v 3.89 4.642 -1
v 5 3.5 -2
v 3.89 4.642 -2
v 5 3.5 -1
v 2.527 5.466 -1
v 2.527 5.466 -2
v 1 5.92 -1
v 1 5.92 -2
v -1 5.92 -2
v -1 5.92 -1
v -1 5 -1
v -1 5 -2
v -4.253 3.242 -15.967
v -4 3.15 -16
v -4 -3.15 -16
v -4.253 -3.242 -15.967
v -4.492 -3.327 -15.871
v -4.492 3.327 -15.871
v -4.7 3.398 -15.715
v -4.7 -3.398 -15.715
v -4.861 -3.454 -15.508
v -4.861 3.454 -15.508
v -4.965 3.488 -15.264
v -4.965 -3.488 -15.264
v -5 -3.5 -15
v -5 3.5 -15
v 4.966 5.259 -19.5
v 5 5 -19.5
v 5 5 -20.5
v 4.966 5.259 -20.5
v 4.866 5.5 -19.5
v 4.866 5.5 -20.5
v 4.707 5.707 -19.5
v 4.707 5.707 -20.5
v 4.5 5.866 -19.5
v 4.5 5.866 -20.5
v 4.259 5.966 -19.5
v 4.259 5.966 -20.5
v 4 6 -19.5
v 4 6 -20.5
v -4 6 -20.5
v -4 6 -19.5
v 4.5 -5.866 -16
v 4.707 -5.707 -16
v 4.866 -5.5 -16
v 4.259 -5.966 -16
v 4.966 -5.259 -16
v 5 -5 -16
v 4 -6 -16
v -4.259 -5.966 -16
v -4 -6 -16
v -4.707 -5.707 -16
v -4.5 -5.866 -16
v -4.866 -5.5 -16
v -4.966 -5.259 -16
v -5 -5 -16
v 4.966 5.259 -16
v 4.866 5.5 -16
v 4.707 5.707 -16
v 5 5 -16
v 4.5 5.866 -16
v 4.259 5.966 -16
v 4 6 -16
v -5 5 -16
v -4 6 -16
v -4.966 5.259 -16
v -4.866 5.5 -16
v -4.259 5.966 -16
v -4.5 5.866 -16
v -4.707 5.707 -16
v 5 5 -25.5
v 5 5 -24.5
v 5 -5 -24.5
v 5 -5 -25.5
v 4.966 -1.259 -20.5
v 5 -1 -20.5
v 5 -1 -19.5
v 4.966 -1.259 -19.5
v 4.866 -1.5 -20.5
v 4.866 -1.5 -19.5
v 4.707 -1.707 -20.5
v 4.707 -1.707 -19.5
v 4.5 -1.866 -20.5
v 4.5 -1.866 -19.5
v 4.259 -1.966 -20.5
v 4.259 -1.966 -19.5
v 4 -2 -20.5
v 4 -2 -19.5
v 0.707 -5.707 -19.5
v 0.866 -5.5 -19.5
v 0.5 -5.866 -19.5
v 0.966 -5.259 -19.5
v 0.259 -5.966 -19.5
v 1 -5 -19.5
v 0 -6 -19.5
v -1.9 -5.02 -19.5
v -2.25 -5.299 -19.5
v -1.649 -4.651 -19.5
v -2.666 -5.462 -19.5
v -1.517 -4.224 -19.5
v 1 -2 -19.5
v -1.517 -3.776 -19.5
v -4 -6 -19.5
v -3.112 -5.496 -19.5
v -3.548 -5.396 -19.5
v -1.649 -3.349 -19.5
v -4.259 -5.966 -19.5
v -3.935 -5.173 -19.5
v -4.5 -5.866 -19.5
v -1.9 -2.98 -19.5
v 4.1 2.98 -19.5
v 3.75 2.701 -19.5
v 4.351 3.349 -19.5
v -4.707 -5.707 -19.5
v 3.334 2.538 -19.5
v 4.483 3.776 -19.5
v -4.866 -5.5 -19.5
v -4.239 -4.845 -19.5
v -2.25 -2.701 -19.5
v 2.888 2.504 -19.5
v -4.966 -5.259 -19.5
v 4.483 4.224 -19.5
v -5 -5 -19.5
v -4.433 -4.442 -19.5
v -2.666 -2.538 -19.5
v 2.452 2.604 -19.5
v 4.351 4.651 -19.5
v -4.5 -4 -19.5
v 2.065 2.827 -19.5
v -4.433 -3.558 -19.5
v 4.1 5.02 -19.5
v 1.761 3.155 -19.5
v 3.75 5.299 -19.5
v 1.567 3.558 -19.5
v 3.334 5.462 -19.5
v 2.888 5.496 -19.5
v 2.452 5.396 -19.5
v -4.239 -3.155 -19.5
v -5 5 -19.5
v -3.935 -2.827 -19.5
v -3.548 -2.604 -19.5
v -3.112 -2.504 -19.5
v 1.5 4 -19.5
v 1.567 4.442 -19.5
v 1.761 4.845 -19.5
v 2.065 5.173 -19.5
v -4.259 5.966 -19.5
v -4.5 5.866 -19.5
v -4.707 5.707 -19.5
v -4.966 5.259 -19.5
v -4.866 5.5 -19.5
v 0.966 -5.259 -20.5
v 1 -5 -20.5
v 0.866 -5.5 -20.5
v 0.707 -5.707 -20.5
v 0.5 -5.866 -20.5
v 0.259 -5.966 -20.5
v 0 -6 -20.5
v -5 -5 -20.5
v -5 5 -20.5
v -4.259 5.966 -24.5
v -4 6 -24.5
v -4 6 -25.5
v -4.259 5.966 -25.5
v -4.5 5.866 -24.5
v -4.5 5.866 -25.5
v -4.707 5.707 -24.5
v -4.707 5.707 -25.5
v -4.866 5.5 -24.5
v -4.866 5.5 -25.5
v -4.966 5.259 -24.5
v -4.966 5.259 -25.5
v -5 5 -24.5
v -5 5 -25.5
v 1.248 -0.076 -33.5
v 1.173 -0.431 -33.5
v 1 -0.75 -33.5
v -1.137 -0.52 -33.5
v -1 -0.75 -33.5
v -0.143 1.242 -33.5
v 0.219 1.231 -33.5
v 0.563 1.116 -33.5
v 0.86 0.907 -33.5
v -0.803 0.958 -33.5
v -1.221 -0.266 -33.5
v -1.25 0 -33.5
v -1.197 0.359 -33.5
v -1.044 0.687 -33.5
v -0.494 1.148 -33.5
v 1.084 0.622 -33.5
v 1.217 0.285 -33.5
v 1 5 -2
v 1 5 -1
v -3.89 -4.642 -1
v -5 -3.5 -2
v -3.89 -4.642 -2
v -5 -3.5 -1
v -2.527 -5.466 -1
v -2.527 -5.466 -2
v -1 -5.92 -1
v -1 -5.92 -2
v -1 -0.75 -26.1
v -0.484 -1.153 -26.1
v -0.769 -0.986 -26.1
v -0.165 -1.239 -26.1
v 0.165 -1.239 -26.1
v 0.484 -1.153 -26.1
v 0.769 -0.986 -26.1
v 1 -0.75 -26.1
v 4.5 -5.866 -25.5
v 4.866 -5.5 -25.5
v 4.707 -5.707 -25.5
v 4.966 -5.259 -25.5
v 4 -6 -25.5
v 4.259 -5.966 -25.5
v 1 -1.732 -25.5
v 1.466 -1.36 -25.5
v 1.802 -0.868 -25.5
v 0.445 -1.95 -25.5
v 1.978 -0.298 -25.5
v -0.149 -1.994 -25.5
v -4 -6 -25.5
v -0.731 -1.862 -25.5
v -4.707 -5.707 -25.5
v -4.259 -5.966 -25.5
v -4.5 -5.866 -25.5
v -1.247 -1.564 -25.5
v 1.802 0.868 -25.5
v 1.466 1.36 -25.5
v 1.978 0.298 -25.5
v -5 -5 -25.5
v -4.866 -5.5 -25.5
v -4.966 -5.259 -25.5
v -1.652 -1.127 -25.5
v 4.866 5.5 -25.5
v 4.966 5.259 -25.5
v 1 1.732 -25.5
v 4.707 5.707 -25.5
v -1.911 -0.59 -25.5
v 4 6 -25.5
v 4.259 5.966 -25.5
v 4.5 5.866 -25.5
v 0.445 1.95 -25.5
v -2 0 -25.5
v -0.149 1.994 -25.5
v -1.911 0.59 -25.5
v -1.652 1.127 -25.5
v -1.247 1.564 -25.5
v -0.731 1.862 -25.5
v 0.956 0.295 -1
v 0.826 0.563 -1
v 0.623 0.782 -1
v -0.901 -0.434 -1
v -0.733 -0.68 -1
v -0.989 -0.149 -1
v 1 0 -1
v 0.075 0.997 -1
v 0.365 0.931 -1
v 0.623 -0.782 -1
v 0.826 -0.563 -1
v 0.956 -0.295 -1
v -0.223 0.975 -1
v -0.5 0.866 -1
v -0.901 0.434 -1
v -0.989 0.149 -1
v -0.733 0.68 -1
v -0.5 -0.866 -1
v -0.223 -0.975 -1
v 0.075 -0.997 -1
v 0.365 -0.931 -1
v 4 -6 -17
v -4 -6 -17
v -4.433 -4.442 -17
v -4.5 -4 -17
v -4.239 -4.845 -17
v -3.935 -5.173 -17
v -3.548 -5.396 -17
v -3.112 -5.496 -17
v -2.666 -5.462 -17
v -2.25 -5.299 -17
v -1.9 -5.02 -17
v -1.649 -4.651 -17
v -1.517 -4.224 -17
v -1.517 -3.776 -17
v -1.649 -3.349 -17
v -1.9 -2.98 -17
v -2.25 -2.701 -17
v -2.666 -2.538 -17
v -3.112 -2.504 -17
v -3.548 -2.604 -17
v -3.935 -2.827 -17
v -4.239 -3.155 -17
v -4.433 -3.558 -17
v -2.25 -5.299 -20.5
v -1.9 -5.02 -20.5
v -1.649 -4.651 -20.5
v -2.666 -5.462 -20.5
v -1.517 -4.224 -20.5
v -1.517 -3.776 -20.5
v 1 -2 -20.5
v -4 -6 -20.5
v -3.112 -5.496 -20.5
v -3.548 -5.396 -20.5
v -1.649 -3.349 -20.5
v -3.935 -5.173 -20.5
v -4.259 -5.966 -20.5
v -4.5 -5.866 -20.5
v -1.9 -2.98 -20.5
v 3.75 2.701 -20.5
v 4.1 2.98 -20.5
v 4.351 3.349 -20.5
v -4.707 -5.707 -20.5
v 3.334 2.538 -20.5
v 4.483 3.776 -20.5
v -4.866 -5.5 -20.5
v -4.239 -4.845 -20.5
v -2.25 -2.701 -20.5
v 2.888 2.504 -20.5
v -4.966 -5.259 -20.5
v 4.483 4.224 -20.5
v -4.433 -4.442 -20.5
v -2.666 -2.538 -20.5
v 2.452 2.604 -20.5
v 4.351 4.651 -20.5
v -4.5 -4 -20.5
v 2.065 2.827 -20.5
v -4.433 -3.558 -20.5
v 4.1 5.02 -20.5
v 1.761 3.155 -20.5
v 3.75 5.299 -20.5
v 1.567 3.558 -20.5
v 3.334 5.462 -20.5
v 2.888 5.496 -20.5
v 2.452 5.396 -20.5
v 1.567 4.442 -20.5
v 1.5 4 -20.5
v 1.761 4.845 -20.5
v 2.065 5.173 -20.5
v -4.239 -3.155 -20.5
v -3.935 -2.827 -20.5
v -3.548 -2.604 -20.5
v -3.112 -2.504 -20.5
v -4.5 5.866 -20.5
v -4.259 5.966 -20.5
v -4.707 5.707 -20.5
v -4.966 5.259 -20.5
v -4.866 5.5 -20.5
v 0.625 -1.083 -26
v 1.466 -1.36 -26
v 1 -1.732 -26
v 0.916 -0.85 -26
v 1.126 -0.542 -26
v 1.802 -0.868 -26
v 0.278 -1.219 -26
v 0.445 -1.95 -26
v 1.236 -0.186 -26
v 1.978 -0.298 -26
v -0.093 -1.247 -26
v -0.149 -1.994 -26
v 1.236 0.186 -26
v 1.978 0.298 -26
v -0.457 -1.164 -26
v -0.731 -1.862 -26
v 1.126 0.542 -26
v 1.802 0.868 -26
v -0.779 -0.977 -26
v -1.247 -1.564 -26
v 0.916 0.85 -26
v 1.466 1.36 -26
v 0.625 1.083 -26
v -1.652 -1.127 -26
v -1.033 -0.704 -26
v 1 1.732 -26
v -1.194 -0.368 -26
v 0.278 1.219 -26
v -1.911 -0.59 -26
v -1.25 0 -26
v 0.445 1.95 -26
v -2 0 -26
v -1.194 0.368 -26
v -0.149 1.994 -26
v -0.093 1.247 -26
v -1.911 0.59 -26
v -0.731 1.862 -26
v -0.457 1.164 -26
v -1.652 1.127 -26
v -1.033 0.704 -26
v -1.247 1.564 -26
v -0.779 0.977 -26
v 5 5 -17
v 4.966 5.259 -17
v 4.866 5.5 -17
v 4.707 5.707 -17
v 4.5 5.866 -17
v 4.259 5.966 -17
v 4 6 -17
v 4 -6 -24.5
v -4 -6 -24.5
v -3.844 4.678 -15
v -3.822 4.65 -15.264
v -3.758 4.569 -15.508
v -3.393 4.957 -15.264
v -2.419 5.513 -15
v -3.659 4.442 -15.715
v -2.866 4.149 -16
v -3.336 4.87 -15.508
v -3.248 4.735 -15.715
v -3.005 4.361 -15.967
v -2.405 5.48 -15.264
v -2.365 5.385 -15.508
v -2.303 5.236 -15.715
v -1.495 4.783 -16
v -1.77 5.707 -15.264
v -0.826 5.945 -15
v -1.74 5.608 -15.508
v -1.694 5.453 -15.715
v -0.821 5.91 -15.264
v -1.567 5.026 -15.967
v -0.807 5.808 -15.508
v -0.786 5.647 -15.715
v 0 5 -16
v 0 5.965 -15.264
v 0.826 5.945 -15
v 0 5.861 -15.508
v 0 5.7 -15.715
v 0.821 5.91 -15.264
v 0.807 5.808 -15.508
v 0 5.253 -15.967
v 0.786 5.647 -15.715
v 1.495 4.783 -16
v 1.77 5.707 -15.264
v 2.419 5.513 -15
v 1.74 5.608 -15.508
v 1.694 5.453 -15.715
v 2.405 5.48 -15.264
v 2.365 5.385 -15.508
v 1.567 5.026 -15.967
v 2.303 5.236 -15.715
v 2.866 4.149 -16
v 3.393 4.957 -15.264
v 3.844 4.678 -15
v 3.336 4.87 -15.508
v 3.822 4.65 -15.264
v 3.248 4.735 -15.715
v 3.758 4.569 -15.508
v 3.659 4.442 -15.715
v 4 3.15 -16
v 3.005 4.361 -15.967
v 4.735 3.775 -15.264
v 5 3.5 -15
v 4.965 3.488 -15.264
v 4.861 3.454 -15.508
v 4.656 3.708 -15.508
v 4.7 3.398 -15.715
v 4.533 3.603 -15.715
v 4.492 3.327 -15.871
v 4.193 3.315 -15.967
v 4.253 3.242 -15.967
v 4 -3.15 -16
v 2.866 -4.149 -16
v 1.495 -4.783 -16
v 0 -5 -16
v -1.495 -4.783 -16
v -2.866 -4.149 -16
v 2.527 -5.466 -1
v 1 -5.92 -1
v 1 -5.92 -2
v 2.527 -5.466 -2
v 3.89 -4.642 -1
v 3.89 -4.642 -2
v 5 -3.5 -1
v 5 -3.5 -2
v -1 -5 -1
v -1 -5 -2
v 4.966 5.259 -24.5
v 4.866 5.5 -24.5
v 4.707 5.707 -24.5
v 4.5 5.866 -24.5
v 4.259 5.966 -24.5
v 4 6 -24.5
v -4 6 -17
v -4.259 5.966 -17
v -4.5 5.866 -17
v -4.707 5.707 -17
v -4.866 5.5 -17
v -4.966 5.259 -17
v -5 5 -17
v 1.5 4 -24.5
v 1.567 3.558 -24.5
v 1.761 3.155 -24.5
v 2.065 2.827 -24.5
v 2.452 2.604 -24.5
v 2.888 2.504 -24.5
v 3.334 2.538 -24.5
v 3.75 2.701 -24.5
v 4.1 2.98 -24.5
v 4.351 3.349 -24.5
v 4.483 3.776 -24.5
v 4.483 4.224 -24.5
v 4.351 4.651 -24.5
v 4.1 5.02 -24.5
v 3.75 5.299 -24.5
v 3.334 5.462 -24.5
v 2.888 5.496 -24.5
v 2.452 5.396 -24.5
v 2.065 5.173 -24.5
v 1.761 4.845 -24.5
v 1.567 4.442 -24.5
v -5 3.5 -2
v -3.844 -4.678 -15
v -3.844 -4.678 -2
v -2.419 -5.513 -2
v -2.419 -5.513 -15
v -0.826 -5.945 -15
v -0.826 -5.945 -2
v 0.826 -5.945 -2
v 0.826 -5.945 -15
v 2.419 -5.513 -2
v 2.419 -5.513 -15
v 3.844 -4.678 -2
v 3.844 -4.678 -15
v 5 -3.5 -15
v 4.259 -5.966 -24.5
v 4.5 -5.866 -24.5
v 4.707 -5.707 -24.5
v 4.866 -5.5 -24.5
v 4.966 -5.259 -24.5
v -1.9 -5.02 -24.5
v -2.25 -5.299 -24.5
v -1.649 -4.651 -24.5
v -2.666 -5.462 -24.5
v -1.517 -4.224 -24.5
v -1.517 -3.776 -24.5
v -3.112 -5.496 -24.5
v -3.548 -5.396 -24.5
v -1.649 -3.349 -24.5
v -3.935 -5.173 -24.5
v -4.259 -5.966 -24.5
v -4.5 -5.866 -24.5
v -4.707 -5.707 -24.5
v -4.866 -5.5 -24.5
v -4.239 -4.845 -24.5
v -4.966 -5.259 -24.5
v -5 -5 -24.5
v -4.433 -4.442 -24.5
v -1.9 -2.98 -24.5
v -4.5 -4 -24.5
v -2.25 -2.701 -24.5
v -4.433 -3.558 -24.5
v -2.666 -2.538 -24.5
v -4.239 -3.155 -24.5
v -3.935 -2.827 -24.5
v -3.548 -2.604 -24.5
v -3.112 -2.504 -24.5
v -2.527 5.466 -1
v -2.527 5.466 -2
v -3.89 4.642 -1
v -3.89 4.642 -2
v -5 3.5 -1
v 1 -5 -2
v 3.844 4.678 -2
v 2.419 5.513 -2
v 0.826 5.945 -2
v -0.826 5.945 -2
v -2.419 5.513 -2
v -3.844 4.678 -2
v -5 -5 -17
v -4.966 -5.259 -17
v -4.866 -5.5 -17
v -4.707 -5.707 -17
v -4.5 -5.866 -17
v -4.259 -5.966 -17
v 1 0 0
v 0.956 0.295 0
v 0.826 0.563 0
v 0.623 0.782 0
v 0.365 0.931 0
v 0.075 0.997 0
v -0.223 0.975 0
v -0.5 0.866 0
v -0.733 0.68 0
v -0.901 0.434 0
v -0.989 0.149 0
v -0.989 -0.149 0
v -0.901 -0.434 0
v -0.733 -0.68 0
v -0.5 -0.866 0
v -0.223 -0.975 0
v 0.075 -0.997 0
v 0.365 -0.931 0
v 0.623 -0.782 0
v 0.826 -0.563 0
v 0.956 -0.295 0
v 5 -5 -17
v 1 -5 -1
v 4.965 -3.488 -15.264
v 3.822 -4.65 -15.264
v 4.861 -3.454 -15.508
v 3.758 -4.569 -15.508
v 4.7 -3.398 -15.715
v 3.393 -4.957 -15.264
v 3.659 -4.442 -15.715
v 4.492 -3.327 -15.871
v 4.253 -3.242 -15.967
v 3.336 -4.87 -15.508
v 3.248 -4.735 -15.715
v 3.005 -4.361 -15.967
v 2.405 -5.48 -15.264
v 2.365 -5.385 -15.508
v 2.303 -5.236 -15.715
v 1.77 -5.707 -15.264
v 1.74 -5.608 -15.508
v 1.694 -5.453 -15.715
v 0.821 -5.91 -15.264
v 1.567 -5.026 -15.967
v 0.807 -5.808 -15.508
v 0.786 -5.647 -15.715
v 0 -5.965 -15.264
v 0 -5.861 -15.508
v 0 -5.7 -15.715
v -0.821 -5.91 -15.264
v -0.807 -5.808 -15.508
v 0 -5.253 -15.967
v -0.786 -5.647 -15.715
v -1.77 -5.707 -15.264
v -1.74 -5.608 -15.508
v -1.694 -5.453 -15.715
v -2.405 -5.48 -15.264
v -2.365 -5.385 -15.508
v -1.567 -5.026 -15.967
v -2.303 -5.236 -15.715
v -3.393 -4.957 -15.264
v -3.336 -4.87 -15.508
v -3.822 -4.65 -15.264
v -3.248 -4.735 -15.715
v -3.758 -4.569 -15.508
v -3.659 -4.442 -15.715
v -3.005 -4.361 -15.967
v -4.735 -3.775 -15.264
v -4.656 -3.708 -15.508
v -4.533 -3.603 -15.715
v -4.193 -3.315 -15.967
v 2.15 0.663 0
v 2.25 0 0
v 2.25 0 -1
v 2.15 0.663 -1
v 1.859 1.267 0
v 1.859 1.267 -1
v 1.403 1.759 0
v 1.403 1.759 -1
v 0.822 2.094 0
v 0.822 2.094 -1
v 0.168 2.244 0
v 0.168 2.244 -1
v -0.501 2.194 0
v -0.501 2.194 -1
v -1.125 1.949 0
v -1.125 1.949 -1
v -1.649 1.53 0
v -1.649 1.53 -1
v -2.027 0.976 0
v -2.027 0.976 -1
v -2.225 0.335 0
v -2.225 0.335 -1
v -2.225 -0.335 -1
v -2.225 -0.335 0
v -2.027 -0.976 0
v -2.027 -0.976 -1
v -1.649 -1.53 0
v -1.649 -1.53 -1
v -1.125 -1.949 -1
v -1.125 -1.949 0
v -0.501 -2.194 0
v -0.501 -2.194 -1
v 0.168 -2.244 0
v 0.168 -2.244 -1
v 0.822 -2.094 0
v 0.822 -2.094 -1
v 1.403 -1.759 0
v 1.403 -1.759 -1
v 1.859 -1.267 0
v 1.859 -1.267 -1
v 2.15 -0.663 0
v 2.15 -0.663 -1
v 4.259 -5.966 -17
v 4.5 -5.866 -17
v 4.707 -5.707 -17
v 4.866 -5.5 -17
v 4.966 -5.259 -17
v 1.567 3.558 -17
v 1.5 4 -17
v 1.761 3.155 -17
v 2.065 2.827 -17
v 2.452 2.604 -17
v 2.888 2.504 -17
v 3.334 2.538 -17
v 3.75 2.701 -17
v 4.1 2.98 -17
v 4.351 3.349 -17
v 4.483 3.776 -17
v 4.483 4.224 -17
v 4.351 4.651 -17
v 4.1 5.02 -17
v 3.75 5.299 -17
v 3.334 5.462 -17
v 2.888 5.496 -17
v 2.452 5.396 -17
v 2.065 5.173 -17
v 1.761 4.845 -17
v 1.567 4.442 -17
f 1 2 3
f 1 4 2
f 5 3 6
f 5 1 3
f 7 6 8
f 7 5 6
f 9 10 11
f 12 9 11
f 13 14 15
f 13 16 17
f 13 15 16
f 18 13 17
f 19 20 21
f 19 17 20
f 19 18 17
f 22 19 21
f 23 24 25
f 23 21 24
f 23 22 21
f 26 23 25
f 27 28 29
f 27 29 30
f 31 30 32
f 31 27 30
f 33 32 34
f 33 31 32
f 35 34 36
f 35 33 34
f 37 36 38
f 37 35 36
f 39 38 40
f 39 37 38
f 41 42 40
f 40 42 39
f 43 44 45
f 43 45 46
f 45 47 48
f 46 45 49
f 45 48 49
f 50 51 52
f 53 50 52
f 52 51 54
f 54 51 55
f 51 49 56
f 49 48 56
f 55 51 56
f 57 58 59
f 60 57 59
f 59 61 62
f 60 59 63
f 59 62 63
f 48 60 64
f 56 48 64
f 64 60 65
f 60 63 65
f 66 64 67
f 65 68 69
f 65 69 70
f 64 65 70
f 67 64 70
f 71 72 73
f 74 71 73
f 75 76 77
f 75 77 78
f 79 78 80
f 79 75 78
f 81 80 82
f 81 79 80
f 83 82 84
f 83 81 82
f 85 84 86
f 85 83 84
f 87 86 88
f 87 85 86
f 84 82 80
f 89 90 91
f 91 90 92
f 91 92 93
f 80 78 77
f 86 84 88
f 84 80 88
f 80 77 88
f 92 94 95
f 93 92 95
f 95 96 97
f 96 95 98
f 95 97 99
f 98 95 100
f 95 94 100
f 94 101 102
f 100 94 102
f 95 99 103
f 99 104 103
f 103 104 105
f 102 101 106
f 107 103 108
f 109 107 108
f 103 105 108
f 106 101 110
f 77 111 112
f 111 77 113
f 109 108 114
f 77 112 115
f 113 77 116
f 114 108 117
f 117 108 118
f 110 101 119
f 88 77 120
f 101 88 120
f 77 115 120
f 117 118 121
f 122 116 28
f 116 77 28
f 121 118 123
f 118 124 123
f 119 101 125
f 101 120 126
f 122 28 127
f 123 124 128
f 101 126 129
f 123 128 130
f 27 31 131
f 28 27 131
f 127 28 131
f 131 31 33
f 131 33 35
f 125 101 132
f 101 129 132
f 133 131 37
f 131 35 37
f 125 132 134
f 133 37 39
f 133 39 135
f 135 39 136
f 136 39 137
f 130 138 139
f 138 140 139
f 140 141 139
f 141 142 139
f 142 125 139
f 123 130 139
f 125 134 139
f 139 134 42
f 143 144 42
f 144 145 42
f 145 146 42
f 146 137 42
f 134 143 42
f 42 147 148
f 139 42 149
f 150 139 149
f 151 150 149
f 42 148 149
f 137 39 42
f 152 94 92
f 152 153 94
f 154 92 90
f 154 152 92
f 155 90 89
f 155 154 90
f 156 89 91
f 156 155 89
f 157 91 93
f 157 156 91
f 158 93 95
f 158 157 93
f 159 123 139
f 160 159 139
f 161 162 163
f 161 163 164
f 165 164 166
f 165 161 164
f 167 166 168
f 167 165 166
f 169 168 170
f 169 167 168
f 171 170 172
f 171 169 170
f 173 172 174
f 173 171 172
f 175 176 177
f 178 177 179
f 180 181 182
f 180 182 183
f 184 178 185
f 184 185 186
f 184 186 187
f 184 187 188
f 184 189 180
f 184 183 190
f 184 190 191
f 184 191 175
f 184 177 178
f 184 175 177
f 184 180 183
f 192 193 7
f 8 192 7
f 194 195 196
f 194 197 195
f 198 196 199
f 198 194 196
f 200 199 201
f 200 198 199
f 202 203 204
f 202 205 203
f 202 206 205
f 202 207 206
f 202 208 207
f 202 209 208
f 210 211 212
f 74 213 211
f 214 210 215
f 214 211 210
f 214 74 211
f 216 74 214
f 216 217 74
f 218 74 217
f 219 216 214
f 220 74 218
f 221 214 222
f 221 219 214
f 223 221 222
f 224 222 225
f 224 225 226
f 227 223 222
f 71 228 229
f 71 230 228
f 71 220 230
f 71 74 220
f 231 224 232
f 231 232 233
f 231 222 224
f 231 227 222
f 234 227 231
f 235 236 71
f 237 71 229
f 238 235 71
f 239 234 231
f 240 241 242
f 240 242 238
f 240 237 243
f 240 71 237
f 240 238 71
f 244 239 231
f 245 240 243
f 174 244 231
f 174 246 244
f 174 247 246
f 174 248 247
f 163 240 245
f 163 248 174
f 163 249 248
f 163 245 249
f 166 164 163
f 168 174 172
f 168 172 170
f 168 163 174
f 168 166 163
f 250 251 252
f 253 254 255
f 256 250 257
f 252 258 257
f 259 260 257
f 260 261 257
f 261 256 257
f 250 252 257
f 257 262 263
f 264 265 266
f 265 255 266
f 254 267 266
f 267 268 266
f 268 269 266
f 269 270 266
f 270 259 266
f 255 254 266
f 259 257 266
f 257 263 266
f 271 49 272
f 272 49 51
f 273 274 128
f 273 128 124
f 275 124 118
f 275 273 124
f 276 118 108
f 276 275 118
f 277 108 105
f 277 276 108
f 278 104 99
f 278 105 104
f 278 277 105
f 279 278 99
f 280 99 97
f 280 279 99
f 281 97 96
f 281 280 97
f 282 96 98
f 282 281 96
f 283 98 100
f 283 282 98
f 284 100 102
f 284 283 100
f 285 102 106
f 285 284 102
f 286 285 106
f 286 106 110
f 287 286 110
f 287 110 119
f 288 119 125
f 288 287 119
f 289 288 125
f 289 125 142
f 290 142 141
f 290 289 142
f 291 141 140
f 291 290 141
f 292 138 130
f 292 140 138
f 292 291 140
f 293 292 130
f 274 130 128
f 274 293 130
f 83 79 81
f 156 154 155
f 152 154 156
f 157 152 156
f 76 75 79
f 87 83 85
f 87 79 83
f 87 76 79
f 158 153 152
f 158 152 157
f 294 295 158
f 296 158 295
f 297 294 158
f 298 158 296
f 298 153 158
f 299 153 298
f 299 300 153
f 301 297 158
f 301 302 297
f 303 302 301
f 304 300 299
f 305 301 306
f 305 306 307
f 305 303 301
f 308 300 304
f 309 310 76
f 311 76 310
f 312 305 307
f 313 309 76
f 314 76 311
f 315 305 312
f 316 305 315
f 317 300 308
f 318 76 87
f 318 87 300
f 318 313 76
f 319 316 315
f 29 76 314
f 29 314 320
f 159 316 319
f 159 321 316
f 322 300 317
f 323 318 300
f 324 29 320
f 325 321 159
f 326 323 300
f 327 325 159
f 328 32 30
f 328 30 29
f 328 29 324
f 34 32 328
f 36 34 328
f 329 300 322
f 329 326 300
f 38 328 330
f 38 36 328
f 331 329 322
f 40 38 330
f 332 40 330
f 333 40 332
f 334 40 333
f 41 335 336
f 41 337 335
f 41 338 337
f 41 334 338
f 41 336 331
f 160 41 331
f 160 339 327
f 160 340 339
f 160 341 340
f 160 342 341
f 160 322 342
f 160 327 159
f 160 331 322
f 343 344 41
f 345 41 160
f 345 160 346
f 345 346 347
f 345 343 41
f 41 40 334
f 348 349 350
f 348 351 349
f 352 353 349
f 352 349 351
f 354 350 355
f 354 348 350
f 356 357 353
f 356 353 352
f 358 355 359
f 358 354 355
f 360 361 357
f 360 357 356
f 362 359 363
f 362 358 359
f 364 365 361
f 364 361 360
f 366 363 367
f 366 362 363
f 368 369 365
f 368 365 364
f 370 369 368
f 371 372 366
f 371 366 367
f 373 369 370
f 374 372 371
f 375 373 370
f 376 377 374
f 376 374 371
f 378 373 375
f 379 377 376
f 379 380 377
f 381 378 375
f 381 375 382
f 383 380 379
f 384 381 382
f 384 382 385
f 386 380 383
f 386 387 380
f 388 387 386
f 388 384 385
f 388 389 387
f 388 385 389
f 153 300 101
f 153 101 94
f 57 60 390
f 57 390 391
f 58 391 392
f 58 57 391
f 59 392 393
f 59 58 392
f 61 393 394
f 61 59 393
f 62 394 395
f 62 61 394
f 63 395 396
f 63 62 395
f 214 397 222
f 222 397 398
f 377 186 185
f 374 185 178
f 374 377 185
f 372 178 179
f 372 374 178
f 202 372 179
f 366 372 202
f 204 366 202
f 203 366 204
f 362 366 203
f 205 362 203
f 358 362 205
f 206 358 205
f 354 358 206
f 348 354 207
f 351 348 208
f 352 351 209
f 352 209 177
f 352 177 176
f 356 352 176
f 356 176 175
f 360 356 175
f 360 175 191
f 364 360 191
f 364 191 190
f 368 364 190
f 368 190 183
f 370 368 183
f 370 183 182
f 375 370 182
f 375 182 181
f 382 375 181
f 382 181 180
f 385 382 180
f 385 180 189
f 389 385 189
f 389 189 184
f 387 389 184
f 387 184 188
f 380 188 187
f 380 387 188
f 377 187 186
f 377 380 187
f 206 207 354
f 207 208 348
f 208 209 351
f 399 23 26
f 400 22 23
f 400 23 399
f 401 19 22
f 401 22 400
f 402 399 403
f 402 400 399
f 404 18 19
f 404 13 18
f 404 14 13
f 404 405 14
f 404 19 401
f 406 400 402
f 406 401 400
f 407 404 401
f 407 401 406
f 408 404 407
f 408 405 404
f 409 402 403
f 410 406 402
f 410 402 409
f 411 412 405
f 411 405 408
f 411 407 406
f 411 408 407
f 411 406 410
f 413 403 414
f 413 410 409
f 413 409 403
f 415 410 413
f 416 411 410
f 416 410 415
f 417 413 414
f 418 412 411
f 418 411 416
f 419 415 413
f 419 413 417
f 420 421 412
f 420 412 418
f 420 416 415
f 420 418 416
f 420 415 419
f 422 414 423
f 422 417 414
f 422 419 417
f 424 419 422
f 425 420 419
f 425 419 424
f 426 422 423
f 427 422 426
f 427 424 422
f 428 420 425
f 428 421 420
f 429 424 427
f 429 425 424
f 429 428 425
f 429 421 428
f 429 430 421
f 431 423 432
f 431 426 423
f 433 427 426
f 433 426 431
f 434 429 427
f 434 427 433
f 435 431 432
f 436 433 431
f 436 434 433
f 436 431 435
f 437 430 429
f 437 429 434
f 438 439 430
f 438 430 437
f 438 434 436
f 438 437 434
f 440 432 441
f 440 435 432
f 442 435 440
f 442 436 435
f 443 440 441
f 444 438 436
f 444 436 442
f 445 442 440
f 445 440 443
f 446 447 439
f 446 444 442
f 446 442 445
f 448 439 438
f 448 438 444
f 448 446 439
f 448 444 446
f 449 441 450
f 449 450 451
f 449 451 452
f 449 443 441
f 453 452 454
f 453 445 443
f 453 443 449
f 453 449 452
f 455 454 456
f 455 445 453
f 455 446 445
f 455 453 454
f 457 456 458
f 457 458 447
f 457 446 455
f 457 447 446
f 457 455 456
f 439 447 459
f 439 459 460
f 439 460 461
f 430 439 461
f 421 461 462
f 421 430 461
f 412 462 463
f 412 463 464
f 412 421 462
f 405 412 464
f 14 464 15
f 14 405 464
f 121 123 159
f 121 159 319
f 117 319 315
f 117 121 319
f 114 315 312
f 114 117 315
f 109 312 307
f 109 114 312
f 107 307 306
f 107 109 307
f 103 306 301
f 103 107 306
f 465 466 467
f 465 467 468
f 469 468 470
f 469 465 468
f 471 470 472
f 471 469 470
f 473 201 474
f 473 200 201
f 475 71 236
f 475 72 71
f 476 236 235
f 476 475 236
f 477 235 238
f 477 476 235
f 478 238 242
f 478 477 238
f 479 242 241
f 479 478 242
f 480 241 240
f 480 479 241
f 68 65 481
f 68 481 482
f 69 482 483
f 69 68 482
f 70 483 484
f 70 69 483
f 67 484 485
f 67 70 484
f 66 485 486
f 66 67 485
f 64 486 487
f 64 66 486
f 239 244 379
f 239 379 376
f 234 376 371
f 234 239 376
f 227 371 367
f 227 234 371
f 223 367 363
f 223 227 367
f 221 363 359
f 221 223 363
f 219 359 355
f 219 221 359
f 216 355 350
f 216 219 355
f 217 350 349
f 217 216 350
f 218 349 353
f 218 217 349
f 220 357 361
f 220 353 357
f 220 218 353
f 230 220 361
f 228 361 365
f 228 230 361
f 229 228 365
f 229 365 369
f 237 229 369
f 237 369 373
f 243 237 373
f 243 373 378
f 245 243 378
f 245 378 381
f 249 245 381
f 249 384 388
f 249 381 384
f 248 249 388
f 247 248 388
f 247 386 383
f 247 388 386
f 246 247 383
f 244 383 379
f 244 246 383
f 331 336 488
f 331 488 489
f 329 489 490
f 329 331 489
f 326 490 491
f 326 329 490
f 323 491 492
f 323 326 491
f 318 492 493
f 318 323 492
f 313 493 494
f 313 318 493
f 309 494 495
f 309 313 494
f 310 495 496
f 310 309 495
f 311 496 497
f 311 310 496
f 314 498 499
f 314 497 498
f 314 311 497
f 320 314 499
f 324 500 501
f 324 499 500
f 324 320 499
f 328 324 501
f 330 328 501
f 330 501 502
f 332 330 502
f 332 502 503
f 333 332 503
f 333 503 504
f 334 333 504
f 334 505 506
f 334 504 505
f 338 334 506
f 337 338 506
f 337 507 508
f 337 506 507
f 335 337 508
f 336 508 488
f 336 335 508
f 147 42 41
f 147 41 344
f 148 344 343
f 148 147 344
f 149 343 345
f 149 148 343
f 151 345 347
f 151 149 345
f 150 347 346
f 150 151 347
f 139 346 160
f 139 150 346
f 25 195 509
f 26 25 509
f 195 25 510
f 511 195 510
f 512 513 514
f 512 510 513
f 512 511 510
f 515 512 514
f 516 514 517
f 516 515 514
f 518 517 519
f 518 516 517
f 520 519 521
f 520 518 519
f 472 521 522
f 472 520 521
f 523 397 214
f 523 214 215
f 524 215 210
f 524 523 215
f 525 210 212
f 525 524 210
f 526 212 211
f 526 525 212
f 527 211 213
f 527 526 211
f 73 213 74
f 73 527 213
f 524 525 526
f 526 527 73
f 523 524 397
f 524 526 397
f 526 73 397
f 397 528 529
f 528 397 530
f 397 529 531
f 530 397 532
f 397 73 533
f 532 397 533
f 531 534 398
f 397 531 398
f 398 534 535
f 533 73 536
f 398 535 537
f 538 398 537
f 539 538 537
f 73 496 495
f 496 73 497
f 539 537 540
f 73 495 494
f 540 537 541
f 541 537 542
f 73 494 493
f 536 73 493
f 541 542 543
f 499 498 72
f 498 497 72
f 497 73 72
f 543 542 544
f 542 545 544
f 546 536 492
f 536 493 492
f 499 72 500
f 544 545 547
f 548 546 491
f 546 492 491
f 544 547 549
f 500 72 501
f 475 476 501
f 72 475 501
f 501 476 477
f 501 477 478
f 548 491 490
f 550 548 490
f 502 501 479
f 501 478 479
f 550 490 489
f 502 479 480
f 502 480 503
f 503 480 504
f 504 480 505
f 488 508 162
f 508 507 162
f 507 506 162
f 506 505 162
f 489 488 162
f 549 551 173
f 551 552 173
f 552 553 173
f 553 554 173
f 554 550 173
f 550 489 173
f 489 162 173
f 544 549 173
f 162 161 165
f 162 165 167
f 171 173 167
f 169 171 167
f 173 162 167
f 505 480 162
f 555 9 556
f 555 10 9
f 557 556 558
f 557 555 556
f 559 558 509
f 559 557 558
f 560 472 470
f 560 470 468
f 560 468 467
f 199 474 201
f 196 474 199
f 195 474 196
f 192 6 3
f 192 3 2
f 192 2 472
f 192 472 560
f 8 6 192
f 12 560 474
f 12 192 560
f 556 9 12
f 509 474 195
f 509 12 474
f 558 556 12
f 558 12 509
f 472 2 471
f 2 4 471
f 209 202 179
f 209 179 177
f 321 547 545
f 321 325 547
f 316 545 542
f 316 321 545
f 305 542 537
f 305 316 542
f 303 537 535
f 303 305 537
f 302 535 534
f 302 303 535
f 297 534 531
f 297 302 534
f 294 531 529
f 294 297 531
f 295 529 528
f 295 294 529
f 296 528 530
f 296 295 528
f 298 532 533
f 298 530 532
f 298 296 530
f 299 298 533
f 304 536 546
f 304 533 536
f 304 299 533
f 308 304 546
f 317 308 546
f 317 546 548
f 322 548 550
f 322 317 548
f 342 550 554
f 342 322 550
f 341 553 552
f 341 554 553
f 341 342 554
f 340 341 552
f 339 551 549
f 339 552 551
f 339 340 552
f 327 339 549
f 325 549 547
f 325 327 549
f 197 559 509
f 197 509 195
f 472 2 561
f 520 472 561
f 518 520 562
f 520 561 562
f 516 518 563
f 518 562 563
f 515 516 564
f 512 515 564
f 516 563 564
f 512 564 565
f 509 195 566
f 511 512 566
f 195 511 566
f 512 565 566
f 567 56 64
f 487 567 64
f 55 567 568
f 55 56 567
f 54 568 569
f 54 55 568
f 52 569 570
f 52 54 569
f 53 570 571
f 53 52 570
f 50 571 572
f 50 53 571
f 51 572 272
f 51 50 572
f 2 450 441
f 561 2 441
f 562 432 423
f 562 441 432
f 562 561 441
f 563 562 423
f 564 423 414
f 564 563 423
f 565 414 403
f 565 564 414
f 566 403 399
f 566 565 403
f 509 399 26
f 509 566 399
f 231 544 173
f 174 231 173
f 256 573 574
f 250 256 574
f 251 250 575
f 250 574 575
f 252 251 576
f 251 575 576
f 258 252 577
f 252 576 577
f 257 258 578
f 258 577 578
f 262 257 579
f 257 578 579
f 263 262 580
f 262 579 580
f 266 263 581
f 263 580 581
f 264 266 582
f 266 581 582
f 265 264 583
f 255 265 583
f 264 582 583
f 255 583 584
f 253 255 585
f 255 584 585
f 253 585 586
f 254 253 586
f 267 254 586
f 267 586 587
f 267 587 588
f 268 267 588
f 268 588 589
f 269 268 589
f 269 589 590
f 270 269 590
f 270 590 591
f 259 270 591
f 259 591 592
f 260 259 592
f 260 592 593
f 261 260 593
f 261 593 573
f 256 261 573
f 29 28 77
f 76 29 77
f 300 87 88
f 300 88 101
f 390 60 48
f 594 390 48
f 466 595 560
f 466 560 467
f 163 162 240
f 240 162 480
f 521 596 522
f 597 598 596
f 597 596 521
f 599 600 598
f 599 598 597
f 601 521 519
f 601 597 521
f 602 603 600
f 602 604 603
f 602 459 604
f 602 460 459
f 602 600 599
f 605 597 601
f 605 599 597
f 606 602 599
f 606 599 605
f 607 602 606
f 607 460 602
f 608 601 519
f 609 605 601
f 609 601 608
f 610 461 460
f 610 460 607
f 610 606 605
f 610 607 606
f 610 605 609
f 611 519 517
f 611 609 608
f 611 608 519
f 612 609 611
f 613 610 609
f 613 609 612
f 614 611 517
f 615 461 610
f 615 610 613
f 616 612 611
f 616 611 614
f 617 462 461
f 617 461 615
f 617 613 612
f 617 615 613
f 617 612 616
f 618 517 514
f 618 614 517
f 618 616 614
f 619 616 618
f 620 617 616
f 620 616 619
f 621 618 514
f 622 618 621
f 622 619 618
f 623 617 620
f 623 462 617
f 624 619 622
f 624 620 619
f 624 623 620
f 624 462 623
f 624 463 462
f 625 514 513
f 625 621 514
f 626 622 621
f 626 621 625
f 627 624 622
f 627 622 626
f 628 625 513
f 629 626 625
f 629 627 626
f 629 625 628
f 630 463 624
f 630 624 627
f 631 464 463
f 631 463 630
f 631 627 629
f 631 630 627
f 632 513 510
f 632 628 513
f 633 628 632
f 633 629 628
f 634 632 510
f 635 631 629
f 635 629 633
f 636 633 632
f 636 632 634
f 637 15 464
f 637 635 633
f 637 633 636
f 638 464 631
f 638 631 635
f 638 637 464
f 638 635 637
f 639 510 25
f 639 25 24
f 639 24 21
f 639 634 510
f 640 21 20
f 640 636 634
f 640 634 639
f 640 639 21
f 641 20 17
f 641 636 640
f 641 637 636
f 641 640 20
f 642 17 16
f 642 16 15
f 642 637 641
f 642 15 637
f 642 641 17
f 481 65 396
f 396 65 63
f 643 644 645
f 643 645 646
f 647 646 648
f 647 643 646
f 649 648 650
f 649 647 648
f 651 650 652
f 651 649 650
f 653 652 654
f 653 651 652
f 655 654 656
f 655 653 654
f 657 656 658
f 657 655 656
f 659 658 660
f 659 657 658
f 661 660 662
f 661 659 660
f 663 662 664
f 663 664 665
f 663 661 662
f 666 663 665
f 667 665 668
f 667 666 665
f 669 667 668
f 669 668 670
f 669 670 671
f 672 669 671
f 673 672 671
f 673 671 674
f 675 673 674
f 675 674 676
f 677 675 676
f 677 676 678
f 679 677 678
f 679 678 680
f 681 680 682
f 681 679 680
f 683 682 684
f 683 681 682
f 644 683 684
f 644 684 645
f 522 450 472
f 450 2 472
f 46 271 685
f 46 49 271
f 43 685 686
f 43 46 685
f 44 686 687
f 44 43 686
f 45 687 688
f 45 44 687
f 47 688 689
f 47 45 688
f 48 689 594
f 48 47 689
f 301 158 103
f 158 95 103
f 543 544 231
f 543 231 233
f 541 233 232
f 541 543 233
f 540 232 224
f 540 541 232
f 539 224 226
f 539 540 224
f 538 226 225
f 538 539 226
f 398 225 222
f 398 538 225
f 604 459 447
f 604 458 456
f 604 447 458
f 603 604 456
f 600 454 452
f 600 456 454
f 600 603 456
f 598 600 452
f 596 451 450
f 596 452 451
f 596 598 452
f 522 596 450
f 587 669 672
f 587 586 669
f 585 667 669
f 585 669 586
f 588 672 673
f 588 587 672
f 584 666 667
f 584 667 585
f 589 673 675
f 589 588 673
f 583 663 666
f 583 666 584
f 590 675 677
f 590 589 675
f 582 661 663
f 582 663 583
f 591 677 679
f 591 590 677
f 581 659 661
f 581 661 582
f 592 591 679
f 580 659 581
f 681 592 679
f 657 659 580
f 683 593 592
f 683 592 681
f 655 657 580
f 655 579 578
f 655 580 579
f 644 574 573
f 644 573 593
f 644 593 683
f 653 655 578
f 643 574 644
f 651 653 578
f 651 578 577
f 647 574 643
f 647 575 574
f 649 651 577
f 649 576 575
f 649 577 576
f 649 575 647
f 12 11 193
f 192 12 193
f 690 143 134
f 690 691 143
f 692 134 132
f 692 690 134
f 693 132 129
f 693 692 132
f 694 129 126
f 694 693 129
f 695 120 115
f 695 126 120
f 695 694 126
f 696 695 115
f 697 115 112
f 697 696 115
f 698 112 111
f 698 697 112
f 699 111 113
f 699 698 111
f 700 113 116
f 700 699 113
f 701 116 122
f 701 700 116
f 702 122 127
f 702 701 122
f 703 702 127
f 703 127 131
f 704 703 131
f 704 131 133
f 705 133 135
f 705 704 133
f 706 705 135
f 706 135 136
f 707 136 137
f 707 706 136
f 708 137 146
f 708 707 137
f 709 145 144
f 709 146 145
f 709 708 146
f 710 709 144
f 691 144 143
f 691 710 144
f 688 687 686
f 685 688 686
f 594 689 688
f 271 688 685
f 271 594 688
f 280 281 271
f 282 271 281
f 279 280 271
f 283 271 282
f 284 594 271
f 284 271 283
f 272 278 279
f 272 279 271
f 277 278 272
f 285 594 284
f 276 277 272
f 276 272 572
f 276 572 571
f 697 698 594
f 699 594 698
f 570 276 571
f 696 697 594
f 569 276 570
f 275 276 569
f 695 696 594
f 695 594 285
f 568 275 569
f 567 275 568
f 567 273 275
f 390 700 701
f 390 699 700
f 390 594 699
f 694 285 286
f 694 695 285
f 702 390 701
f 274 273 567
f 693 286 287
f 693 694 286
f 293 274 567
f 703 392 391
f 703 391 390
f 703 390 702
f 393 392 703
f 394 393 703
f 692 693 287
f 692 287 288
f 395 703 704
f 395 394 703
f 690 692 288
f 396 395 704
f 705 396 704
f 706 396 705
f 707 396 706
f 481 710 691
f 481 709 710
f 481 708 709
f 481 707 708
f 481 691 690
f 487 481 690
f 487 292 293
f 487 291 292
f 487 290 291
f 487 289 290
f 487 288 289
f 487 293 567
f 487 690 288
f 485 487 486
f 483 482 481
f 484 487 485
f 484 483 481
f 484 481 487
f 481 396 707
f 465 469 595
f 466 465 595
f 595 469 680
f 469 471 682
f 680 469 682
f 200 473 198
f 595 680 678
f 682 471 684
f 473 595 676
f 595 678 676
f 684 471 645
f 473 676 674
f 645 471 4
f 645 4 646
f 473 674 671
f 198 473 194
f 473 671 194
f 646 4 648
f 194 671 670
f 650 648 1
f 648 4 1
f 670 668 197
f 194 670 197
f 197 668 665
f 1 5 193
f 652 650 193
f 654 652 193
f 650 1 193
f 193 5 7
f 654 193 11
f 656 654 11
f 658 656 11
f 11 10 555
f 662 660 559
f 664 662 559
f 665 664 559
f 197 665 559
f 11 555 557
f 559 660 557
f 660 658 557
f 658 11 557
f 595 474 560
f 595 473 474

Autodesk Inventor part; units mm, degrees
ref_plane "YZ Plane" through (0, 0, 0) normal (1, 0, 0) x (0, 1, 0)
ref_plane "XZ Plane" through (0, 0, 0) normal (0, 1, 0) x (-1, 0, 0)
ref_plane "XY Plane" through (0, 0, 0) normal (0, 0, 1) x (1, 0, 0)
sketch "草图1" plane through (0, 0, 0) normal (0, 0, 1) x (1, 0, 0)
  circle A0 centre (0, 0) radius 2.25
  circle A1 centre (0, 0) radius 1
  dimension "d0" = 4.5
  dimension "d1" = 2
extrude "拉伸1" add sketch "草图1" against normal blind 1
sketch "草图2" plane through (0, 0, -1) normal (0, 0, -1) x (-1, 0, 0)
  line L0 (5, 3.5) -> (5, -3.5)
  line L1 (-5, 3.5) -> (-5, -3.5)
  line L2 (5, -3.5) -> (-5, -3.5) construction
  line L3 (5, 3.5) -> (-5, 3.5) construction
  line L4 (0, 0) -> (0, 19.9498)
  line L5 (0, 0) -> (7.1401, 0)
  line L6 (1, 5.9195) -> (1, 5)
  line L7 (1, 5) -> (-1, 5)
  line L8 (-1, 5) -> (-1, 5.9195)
  arc A0 (5, 3.5) -> (1, 5.9195) centre (0, -0.25) ccw
  arc A1 (-1, 5.9195) -> (-5, 3.5) centre (0, -0.25) ccw
  line L9 (1, -5.9195) -> (1, -5)
  line L10 (1, -5) -> (-1, -5)
  line L11 (-1, -5) -> (-1, -5.9195)
  arc A2 (-5, -3.5) -> (-1, -5.9195) centre (0, 0.25) ccw
  arc A3 (1, -5.9195) -> (5, -3.5) centre (0, 0.25) ccw
  point P0 (0, 6)
  point P1 (0, 6)
  dimension "d4" = 10
  dimension "d7" = 7
  dimension "d8" = 6
  dimension "d9" = 1
  dimension "d10" = 2
extrude "拉伸2" add sketch "草图2" along normal blind 1
sketch "草图3" plane through (0, 0, -2) normal (0, 0, -1) x (-1, 0, 0)
  line L0 (1, 5) -> (-1, 5) construction
  line L1 (-1, 5) -> (-1, 5.9195) construction
  arc A0 (-1, 5.9195) -> (-5, 3.5) centre (0, -0.25) ccw construction
  line L2 (-5, 3.5) -> (-5, -3.5) projected
  arc A1 (-5, -3.5) -> (-1, -5.9195) centre (0, 0.25) ccw construction
  line L3 (-1, -5.9195) -> (-1, -5) construction
  line L4 (-1, -5) -> (1, -5) construction
  line L5 (1, -5) -> (1, -5.9195) construction
  arc A2 (1, -5.9195) -> (5, -3.5) centre (0, 0.25) ccw construction
  line L6 (5, -3.5) -> (5, 3.5) projected
  arc A3 (5, 3.5) -> (1, 5.9195) centre (0, -0.25) ccw construction
  line L7 (1, 5.9195) -> (1, 5) construction
  arc A4 (5, 3.5) -> (-5, 3.5) centre (0, -0.25) ccw
  line L8 (0, 0) -> (3.3982, 0)
  arc A5 (-5, -3.5) -> (5, -3.5) centre (0, 0.25) ccw
extrude "拉伸3" add sketch "草图3" along normal blind 14 separate body
fillet "圆角1" radius 1 4 edges at (0, 6, -16) (-5, 0, -16) (0, -6, -16) (5, 0, -16)
sketch "草图4" plane through (0, 0, -16) normal (0, 0, -1) x (-1, 0, 0)
  line L0 (-5, 5) -> (-5, -5)
  line L1 (-4, -6) -> (4, -6)
  line L2 (5, -5) -> (5, 5)
  line L3 (4, 6) -> (-4, 6)
  line L4 (0, 0) -> (0, 19.5528)
  line L5 (0, 0) -> (-9.7016, 0)
  arc A0 (-5, -5) -> (-4, -6) centre (-4, -5) ccw
  arc A1 (-4, 6) -> (-5, 5) centre (-4, 5) ccw
  arc A2 (5, 5) -> (4, 6) centre (4, 5) ccw
  arc A3 (4, -6) -> (5, -5) centre (4, -5) ccw
  dimension "d16" = 1
  dimension "d17" = 10
  dimension "d18" = 12
extrude "拉伸4" add sketch "草图4" along normal blind 1 separate body
sketch "草图5" plane through (0, 0, -17) normal (0, 0, -1) x (-1, 0, 0)
  circle A0 centre (3, -4) radius 1.5
  circle A1 centre (-3, 4) radius 1.5
  line L0 (5, -5) -> (5, 5) projected
  line L1 (-4, -6) -> (4, -6) projected
  line L2 (4, 6) -> (-4, 6) projected
  line L3 (-5, 5) -> (-5, -5) projected
  point P0 (0, 0)
  dimension "d21" = 3
  dimension "d22" = 2
  dimension "d23" = 2
  dimension "d24" = 2
  dimension "d25" = 2
extrude "拉伸5" add sketch "草图5" along normal blind 2.5 bodies 3
sketch "草图6" plane through (-3, -4, -19.5) normal (0, 0, -1) x (-1, 0, 0)
  circle A0 centre (-6, 8) radius 1.5 construction
  circle A1 centre (0, 0) radius 1.5 construction
  line L0 (-8, 9) -> (-8, -1) projected
  arc A2 (-8, -1) -> (-7, -2) centre (-7, -1) ccw projected
  line L1 (-7, -2) -> (1, -2) projected
  arc A3 (1, -2) -> (2, -1) centre (1, -1) ccw projected
  line L2 (2, -1) -> (2, 9) projected
  arc A4 (2, 9) -> (1, 10) centre (1, 9) ccw projected
  line L3 (1, 10) -> (-7, 10) projected
  arc A5 (-7, 10) -> (-8, 9) centre (-7, 9) ccw projected
  point P0 (-3, 4)
extrude "拉伸6" add sketch "草图6" along normal blind 1 bodies 3
sketch "草图7" plane through (-3, -4, -20.5) normal (0, 0, -1) x (-1, 0, 0)
  circle A0 centre (0, 0) radius 1.5 projected
  circle A1 centre (-6, 8) radius 1.5 projected
  point P0 (-3, 4)
extrude "拉伸7" add sketch "草图7" along normal blind 4 bodies 3
sketch "草图8" plane through (-3, -4, -24.5) normal (0, 0, -1) x (-1, 0, 0)
  circle A0 centre (-6, 8) radius 1.5 construction
  circle A1 centre (0, 0) radius 1.5 construction
  arc A2 (-8, -1) -> (-7, -2) centre (-7, -1) ccw projected
  line L0 (-7, -2) -> (1, -2) projected
  arc A3 (1, -2) -> (2, -1) centre (1, -1) ccw projected
  line L1 (2, -1) -> (2, 9) projected
  arc A4 (2, 9) -> (1, 10) centre (1, 9) ccw projected
  line L2 (1, 10) -> (-7, 10) projected
  arc A5 (-7, 10) -> (-8, 9) centre (-7, 9) ccw projected
  line L3 (-8, 9) -> (-8, -1) projected
  point P0 (-3, 4)
extrude "拉伸8" add sketch "草图8" along normal blind 1 bodies 3
sketch "草图9" plane through (-3, -4, -25.5) normal (0, 0, -1) x (-1, 0, 0)
  circle A0 centre (-3, 4) radius 1 projected
  circle A1 centre (-3, 4) radius 2
  circle A2 centre (-3, 4) radius 1.25
  dimension "d34" = 4
  dimension "d35" = 2.5
extrude "拉伸9" add sketch "草图9" along normal blind 0.5 contours A1 bodies 3
sketch "草图10" plane through (0, 0, -25.5) normal (0, 0, -1) x (-1, 0, 0)
  circle A0 centre (0, 0) radius 1.25
  circle A1 centre (0, 0) radius 1.25 projected
  line L0 (1, -0.75) -> (-1, -0.75)
  point P0 (-1, -0.75)
  point P1 (1, -0.75)
  dimension "d38" = 2
  dimension "d39" = 2.5
extrude "拉伸10" add sketch "草图10" along normal blind 0.6 bodies 3
extrude "拉伸11" add sketch "草图10" along normal blind 8 contours A0 L0 picked at (0.3616, -0.1518) bodies 3
sketch "草图11" plane through (-3, -4, -20.5) normal (0, 0, -1) x (-1, 0, 0)
  line L0 (-7, 2) -> (-4, 2)
  line L1 (-4, 2) -> (-4, -1)
  line L2 (-7, -2) -> (1, -2) construction
  line L3 (-7, -2) -> (1, -2) projected
  arc A0 (-4, -1) -> (-3, -2) centre (-3, -1) ccw
  arc A1 (-8, 3) -> (-7, 2) centre (-7, 3) ccw
  arc A2 (-8, -1) -> (-7, -2) centre (-7, -1) ccw projected
  line L4 (-3, -2) -> (-7, -2)
  arc A3 (-8, 0.5) -> (2, 0.5) centre (-3, 4.25) ccw construction
  line L5 (-8, 9) -> (-8, -1) construction
  line L6 (-8, 3) -> (-8, -1)
  point P0 (-3, 4)
  point P1 (-8, 2)
  point P2 (-4, -2)
  dimension "d45" = 4
  dimension "d46" = 1
  dimension "d47" = 1
extrude "拉伸12" cut sketch "草图11" against normal blind 1.5 bodies 3
properties part number "GA12-N20微型减速直流电机3V_15RPM"
